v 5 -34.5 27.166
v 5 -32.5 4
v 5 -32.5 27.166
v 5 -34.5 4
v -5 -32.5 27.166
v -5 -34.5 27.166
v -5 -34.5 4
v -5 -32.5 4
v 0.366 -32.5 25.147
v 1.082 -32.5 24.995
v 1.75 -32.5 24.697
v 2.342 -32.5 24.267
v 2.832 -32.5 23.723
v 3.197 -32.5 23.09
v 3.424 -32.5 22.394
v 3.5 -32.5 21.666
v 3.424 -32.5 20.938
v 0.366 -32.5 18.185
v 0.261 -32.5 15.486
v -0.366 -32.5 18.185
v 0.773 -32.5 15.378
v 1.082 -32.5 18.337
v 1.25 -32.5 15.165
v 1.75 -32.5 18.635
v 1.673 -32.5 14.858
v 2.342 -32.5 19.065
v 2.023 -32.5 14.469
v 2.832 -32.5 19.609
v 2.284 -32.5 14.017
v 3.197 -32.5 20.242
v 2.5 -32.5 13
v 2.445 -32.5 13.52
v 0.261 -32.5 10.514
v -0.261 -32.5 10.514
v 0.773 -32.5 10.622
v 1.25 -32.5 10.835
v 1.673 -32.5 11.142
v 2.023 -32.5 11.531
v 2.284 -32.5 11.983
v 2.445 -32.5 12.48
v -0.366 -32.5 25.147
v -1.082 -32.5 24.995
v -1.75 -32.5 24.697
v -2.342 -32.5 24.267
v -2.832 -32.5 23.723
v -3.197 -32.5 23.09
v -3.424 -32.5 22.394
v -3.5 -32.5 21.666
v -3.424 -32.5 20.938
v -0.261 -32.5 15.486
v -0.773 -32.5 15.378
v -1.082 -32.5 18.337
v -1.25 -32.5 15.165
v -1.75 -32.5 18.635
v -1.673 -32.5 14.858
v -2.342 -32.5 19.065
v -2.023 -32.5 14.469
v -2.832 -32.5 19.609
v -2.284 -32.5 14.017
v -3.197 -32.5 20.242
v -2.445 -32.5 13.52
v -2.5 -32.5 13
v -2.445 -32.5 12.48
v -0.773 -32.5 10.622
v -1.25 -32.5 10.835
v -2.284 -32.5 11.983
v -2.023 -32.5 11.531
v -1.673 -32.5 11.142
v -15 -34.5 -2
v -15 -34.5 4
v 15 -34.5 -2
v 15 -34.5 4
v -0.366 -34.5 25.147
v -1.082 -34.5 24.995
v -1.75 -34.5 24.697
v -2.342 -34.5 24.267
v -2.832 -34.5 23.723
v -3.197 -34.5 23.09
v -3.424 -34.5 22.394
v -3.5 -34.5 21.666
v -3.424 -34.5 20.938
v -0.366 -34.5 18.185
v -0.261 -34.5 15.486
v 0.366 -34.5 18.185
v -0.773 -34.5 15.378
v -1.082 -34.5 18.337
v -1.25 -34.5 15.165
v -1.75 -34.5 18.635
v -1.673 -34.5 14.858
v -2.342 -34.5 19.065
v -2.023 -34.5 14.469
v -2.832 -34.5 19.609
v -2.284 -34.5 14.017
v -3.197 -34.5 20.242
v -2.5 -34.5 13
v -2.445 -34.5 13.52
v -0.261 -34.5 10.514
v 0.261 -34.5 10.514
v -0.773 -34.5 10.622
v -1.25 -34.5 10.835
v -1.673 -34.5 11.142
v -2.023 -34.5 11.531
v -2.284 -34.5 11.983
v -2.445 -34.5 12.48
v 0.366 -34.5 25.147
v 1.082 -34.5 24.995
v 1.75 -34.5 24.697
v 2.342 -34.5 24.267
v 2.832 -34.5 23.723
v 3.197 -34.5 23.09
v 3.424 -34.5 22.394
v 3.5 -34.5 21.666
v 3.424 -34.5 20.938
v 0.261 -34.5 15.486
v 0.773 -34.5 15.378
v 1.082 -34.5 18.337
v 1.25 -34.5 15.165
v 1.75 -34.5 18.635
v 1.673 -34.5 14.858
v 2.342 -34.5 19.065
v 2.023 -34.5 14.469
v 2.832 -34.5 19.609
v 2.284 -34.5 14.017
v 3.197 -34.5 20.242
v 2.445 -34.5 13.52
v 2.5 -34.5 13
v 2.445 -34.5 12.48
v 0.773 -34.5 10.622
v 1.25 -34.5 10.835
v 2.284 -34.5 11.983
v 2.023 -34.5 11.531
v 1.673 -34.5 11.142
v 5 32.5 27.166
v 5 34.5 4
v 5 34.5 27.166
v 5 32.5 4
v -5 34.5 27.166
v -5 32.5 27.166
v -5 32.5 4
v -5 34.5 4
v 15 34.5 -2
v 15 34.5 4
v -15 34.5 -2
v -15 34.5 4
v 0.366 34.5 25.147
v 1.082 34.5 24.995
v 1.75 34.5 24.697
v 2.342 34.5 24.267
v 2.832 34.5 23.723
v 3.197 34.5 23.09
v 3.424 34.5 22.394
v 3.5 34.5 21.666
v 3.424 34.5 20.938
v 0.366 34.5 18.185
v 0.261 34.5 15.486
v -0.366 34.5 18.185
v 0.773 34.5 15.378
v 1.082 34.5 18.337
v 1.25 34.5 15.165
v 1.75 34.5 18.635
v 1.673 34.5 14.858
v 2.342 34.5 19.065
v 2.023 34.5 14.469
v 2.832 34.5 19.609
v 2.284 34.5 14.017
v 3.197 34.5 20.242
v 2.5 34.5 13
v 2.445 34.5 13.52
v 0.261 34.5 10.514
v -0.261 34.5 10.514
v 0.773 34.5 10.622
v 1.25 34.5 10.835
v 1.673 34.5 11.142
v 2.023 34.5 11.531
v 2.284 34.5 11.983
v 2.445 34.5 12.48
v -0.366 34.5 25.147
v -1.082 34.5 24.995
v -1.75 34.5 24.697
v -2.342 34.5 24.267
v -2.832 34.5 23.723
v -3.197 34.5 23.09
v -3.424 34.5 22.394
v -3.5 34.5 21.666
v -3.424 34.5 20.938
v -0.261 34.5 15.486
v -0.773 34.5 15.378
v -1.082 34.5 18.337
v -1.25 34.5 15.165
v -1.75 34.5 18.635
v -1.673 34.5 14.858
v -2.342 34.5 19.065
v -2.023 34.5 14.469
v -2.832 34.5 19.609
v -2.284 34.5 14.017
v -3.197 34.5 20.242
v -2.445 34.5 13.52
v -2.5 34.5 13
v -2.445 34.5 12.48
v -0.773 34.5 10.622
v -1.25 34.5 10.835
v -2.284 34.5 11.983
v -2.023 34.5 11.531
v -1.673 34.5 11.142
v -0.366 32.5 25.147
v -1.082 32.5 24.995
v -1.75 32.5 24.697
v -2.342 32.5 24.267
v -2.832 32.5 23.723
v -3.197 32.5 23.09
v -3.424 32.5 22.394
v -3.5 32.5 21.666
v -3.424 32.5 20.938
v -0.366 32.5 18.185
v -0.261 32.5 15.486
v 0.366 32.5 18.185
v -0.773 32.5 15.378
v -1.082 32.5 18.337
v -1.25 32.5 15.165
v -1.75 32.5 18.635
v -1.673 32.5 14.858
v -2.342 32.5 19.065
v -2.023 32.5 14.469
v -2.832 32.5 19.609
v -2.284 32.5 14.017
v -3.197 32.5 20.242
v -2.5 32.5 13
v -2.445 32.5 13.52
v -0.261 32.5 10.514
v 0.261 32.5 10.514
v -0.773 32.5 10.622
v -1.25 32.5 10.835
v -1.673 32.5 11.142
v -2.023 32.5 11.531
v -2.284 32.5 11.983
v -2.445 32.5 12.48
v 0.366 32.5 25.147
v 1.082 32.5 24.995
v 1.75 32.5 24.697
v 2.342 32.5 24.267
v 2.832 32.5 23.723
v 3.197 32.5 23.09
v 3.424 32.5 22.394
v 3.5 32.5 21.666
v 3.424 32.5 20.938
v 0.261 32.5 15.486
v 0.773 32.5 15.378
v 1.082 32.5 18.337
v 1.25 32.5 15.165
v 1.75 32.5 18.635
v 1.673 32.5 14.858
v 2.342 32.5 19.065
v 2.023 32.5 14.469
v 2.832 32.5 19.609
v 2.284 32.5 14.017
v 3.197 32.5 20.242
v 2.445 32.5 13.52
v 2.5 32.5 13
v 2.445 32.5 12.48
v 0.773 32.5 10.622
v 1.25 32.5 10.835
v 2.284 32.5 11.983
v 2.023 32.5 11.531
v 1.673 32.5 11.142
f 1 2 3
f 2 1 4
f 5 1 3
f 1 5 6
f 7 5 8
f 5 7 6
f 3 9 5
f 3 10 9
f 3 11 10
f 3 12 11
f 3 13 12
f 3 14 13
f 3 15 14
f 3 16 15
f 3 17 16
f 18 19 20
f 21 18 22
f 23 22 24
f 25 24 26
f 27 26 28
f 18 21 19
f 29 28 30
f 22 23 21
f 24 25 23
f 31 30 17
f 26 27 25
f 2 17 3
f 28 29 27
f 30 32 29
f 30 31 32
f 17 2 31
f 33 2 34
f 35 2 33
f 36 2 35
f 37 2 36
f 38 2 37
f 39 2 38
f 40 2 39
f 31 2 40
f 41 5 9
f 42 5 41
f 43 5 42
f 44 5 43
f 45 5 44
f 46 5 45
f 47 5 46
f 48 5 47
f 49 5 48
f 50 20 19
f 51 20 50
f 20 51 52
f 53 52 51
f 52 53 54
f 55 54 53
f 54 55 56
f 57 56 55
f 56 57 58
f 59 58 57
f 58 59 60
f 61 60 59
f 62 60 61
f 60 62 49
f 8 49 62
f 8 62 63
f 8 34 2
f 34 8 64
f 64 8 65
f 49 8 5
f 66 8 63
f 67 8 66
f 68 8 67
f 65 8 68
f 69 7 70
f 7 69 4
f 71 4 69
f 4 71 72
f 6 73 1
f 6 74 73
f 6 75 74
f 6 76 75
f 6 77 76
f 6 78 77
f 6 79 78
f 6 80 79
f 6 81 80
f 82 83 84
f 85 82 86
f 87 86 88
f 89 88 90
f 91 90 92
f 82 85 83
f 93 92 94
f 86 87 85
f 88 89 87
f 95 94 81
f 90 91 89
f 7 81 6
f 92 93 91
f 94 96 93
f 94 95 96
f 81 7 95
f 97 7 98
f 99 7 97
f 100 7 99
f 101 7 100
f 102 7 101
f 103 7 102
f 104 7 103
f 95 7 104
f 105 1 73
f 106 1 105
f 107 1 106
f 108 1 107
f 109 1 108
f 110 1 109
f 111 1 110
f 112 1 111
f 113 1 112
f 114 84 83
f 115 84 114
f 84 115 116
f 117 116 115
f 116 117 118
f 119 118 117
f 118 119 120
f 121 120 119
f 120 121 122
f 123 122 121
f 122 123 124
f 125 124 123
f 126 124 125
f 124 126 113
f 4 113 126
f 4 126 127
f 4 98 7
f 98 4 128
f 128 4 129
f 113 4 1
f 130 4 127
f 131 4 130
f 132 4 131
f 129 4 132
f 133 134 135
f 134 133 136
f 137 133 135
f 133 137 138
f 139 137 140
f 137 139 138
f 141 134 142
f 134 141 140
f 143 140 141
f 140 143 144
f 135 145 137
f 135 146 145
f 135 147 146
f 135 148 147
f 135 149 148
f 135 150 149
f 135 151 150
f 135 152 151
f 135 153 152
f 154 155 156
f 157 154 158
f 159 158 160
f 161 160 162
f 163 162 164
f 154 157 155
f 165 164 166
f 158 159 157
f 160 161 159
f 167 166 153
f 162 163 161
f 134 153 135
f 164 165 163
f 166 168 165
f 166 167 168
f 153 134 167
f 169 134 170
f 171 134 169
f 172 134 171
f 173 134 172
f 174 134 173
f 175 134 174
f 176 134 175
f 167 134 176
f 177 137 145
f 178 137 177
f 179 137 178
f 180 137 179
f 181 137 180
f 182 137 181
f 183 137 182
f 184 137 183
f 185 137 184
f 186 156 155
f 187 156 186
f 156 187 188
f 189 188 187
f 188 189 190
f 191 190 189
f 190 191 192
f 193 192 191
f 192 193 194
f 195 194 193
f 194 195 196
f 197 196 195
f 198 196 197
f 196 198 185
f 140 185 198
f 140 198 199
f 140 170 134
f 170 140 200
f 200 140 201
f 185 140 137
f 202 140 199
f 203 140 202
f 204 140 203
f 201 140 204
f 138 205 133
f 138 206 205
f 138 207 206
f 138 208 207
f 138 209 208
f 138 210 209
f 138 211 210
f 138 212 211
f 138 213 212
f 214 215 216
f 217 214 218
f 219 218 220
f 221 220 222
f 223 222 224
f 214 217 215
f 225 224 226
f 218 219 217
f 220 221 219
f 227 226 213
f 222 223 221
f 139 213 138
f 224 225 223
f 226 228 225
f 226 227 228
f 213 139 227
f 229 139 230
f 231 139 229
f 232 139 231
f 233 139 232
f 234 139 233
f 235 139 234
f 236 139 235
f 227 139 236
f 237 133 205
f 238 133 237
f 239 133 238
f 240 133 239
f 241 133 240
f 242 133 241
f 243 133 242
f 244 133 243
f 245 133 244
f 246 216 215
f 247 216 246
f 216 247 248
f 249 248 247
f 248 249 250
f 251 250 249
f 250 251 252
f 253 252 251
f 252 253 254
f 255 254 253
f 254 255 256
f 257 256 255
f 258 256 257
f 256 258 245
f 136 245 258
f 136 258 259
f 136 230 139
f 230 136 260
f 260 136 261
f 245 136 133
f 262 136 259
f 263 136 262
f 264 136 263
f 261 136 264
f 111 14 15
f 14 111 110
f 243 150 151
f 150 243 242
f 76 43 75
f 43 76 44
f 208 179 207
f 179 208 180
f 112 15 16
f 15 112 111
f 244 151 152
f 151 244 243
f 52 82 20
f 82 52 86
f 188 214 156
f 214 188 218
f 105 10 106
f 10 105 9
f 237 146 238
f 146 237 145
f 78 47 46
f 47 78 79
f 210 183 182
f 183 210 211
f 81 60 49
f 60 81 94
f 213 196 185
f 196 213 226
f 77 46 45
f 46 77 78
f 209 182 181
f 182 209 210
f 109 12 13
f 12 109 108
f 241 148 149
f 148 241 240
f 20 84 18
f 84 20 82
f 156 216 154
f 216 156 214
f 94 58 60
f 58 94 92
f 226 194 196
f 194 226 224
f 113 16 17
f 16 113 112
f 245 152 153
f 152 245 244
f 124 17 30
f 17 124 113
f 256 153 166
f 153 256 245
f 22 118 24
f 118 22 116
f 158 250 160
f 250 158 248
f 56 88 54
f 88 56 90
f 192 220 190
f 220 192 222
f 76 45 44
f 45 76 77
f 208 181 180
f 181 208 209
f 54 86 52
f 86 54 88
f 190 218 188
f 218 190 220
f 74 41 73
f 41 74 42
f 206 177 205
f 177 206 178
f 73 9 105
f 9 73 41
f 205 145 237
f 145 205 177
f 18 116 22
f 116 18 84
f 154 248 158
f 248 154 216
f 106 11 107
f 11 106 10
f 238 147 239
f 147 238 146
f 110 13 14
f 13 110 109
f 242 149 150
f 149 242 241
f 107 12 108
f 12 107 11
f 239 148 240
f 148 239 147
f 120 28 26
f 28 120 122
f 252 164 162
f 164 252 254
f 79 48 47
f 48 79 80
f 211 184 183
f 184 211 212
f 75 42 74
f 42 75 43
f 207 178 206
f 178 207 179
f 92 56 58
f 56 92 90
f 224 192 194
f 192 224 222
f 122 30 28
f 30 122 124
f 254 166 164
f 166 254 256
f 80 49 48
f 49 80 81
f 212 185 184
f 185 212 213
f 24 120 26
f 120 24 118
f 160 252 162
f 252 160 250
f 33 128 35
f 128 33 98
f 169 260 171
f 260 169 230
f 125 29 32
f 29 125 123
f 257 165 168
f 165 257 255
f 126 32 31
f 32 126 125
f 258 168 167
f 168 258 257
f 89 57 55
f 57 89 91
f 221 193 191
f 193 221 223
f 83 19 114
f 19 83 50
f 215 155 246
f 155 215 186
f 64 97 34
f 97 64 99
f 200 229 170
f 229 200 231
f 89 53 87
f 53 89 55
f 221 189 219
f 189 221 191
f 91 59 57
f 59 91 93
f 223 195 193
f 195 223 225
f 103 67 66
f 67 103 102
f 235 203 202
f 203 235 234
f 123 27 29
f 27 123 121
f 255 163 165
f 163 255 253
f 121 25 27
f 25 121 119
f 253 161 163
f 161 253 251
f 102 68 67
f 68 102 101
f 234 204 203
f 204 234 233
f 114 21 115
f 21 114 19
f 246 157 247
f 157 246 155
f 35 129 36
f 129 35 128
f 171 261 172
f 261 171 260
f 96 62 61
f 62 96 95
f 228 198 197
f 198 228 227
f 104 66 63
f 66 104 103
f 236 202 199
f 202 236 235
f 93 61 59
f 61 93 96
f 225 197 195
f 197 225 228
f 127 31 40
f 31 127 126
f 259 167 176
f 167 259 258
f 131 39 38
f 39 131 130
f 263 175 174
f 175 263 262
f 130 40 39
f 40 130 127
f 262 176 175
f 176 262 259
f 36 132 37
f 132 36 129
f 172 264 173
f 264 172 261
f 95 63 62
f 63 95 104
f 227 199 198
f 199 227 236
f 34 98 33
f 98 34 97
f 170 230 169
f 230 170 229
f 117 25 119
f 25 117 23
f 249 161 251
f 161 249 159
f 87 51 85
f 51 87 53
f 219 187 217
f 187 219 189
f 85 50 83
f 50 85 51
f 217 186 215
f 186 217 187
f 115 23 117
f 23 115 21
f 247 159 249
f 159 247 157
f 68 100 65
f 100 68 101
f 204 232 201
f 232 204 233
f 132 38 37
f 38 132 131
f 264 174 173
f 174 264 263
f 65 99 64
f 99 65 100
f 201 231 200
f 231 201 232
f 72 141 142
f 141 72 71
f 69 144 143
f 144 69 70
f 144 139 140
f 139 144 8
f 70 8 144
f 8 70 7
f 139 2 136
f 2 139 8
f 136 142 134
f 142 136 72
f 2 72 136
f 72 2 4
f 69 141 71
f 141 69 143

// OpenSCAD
/* Standard Comment Notation

    Use the following on X,Y,Z arrays
    
//-------X-------
,//-------Y-------
,//-------Z------- 

ex.
[
//-------X-------
2+3
,//-------Y-------
foo_y
,//-------Z------- 
foo_z
]
*/

$fn = 30;

structure_slot_width = 35;
sweep_bearing_width = structure_slot_width + 20;
sweep_bearing_leg_width = 2;


true_sweep_bearing_width = 
    sweep_bearing_width + 
    sweep_bearing_leg_width * 2;

platform_height = 2;
platform_depth = 30;
platform_width = true_sweep_bearing_width + 6;

above_hole_height = 2;
hole_dia          = 7;

servo_hole_height = 12;
servo_height = 6;


servo_bed_height = servo_hole_height-servo_height;

hole_distance = 8.666;

below_hole_height = -hole_dia/2 + hole_distance + servo_hole_height;

servo_hole_dia = 5;

arm_height = above_hole_height + hole_dia + below_hole_height;
arm_width = 10;
arm_depth = 2;




//Platform
cube([platform_depth, platform_width+arm_depth*2, platform_height],
    center=true);
//Servo bed
translate([0,0,platform_height/2])
cube([platform_depth, platform_width+arm_depth*2, servo_bed_height],
    center=true);

difference(){
    //Arms
    for(SIGN = [-1,1]){
        translate([
            //-------X-------
            0
            ,//-------Y-------
            (   
                SIGN * (
                    platform_width + 
                    arm_depth
                )   
            )/2
            ,//-------Z------- 
            arm_height/2 + platform_height/2
        ]){
            cube([   
                //-------X-------
                arm_width,
                
                //-------Y-------
                arm_depth,
                
                //-------Z-------
                arm_height 
             ],
                center = true);
        }
    }

    //Bearing Hole
    translate([0, 0, below_hole_height + hole_dia/2 + platform_height/2])
    rotate([90,0,0])
    cylinder(d=hole_dia, 120, center = true);
    
    //Servo Hole
    translate([0, 0, servo_hole_height + platform_height/2])
    rotate([90,0,0])
    cylinder(d=servo_hole_dia, 120, center = true);
}
